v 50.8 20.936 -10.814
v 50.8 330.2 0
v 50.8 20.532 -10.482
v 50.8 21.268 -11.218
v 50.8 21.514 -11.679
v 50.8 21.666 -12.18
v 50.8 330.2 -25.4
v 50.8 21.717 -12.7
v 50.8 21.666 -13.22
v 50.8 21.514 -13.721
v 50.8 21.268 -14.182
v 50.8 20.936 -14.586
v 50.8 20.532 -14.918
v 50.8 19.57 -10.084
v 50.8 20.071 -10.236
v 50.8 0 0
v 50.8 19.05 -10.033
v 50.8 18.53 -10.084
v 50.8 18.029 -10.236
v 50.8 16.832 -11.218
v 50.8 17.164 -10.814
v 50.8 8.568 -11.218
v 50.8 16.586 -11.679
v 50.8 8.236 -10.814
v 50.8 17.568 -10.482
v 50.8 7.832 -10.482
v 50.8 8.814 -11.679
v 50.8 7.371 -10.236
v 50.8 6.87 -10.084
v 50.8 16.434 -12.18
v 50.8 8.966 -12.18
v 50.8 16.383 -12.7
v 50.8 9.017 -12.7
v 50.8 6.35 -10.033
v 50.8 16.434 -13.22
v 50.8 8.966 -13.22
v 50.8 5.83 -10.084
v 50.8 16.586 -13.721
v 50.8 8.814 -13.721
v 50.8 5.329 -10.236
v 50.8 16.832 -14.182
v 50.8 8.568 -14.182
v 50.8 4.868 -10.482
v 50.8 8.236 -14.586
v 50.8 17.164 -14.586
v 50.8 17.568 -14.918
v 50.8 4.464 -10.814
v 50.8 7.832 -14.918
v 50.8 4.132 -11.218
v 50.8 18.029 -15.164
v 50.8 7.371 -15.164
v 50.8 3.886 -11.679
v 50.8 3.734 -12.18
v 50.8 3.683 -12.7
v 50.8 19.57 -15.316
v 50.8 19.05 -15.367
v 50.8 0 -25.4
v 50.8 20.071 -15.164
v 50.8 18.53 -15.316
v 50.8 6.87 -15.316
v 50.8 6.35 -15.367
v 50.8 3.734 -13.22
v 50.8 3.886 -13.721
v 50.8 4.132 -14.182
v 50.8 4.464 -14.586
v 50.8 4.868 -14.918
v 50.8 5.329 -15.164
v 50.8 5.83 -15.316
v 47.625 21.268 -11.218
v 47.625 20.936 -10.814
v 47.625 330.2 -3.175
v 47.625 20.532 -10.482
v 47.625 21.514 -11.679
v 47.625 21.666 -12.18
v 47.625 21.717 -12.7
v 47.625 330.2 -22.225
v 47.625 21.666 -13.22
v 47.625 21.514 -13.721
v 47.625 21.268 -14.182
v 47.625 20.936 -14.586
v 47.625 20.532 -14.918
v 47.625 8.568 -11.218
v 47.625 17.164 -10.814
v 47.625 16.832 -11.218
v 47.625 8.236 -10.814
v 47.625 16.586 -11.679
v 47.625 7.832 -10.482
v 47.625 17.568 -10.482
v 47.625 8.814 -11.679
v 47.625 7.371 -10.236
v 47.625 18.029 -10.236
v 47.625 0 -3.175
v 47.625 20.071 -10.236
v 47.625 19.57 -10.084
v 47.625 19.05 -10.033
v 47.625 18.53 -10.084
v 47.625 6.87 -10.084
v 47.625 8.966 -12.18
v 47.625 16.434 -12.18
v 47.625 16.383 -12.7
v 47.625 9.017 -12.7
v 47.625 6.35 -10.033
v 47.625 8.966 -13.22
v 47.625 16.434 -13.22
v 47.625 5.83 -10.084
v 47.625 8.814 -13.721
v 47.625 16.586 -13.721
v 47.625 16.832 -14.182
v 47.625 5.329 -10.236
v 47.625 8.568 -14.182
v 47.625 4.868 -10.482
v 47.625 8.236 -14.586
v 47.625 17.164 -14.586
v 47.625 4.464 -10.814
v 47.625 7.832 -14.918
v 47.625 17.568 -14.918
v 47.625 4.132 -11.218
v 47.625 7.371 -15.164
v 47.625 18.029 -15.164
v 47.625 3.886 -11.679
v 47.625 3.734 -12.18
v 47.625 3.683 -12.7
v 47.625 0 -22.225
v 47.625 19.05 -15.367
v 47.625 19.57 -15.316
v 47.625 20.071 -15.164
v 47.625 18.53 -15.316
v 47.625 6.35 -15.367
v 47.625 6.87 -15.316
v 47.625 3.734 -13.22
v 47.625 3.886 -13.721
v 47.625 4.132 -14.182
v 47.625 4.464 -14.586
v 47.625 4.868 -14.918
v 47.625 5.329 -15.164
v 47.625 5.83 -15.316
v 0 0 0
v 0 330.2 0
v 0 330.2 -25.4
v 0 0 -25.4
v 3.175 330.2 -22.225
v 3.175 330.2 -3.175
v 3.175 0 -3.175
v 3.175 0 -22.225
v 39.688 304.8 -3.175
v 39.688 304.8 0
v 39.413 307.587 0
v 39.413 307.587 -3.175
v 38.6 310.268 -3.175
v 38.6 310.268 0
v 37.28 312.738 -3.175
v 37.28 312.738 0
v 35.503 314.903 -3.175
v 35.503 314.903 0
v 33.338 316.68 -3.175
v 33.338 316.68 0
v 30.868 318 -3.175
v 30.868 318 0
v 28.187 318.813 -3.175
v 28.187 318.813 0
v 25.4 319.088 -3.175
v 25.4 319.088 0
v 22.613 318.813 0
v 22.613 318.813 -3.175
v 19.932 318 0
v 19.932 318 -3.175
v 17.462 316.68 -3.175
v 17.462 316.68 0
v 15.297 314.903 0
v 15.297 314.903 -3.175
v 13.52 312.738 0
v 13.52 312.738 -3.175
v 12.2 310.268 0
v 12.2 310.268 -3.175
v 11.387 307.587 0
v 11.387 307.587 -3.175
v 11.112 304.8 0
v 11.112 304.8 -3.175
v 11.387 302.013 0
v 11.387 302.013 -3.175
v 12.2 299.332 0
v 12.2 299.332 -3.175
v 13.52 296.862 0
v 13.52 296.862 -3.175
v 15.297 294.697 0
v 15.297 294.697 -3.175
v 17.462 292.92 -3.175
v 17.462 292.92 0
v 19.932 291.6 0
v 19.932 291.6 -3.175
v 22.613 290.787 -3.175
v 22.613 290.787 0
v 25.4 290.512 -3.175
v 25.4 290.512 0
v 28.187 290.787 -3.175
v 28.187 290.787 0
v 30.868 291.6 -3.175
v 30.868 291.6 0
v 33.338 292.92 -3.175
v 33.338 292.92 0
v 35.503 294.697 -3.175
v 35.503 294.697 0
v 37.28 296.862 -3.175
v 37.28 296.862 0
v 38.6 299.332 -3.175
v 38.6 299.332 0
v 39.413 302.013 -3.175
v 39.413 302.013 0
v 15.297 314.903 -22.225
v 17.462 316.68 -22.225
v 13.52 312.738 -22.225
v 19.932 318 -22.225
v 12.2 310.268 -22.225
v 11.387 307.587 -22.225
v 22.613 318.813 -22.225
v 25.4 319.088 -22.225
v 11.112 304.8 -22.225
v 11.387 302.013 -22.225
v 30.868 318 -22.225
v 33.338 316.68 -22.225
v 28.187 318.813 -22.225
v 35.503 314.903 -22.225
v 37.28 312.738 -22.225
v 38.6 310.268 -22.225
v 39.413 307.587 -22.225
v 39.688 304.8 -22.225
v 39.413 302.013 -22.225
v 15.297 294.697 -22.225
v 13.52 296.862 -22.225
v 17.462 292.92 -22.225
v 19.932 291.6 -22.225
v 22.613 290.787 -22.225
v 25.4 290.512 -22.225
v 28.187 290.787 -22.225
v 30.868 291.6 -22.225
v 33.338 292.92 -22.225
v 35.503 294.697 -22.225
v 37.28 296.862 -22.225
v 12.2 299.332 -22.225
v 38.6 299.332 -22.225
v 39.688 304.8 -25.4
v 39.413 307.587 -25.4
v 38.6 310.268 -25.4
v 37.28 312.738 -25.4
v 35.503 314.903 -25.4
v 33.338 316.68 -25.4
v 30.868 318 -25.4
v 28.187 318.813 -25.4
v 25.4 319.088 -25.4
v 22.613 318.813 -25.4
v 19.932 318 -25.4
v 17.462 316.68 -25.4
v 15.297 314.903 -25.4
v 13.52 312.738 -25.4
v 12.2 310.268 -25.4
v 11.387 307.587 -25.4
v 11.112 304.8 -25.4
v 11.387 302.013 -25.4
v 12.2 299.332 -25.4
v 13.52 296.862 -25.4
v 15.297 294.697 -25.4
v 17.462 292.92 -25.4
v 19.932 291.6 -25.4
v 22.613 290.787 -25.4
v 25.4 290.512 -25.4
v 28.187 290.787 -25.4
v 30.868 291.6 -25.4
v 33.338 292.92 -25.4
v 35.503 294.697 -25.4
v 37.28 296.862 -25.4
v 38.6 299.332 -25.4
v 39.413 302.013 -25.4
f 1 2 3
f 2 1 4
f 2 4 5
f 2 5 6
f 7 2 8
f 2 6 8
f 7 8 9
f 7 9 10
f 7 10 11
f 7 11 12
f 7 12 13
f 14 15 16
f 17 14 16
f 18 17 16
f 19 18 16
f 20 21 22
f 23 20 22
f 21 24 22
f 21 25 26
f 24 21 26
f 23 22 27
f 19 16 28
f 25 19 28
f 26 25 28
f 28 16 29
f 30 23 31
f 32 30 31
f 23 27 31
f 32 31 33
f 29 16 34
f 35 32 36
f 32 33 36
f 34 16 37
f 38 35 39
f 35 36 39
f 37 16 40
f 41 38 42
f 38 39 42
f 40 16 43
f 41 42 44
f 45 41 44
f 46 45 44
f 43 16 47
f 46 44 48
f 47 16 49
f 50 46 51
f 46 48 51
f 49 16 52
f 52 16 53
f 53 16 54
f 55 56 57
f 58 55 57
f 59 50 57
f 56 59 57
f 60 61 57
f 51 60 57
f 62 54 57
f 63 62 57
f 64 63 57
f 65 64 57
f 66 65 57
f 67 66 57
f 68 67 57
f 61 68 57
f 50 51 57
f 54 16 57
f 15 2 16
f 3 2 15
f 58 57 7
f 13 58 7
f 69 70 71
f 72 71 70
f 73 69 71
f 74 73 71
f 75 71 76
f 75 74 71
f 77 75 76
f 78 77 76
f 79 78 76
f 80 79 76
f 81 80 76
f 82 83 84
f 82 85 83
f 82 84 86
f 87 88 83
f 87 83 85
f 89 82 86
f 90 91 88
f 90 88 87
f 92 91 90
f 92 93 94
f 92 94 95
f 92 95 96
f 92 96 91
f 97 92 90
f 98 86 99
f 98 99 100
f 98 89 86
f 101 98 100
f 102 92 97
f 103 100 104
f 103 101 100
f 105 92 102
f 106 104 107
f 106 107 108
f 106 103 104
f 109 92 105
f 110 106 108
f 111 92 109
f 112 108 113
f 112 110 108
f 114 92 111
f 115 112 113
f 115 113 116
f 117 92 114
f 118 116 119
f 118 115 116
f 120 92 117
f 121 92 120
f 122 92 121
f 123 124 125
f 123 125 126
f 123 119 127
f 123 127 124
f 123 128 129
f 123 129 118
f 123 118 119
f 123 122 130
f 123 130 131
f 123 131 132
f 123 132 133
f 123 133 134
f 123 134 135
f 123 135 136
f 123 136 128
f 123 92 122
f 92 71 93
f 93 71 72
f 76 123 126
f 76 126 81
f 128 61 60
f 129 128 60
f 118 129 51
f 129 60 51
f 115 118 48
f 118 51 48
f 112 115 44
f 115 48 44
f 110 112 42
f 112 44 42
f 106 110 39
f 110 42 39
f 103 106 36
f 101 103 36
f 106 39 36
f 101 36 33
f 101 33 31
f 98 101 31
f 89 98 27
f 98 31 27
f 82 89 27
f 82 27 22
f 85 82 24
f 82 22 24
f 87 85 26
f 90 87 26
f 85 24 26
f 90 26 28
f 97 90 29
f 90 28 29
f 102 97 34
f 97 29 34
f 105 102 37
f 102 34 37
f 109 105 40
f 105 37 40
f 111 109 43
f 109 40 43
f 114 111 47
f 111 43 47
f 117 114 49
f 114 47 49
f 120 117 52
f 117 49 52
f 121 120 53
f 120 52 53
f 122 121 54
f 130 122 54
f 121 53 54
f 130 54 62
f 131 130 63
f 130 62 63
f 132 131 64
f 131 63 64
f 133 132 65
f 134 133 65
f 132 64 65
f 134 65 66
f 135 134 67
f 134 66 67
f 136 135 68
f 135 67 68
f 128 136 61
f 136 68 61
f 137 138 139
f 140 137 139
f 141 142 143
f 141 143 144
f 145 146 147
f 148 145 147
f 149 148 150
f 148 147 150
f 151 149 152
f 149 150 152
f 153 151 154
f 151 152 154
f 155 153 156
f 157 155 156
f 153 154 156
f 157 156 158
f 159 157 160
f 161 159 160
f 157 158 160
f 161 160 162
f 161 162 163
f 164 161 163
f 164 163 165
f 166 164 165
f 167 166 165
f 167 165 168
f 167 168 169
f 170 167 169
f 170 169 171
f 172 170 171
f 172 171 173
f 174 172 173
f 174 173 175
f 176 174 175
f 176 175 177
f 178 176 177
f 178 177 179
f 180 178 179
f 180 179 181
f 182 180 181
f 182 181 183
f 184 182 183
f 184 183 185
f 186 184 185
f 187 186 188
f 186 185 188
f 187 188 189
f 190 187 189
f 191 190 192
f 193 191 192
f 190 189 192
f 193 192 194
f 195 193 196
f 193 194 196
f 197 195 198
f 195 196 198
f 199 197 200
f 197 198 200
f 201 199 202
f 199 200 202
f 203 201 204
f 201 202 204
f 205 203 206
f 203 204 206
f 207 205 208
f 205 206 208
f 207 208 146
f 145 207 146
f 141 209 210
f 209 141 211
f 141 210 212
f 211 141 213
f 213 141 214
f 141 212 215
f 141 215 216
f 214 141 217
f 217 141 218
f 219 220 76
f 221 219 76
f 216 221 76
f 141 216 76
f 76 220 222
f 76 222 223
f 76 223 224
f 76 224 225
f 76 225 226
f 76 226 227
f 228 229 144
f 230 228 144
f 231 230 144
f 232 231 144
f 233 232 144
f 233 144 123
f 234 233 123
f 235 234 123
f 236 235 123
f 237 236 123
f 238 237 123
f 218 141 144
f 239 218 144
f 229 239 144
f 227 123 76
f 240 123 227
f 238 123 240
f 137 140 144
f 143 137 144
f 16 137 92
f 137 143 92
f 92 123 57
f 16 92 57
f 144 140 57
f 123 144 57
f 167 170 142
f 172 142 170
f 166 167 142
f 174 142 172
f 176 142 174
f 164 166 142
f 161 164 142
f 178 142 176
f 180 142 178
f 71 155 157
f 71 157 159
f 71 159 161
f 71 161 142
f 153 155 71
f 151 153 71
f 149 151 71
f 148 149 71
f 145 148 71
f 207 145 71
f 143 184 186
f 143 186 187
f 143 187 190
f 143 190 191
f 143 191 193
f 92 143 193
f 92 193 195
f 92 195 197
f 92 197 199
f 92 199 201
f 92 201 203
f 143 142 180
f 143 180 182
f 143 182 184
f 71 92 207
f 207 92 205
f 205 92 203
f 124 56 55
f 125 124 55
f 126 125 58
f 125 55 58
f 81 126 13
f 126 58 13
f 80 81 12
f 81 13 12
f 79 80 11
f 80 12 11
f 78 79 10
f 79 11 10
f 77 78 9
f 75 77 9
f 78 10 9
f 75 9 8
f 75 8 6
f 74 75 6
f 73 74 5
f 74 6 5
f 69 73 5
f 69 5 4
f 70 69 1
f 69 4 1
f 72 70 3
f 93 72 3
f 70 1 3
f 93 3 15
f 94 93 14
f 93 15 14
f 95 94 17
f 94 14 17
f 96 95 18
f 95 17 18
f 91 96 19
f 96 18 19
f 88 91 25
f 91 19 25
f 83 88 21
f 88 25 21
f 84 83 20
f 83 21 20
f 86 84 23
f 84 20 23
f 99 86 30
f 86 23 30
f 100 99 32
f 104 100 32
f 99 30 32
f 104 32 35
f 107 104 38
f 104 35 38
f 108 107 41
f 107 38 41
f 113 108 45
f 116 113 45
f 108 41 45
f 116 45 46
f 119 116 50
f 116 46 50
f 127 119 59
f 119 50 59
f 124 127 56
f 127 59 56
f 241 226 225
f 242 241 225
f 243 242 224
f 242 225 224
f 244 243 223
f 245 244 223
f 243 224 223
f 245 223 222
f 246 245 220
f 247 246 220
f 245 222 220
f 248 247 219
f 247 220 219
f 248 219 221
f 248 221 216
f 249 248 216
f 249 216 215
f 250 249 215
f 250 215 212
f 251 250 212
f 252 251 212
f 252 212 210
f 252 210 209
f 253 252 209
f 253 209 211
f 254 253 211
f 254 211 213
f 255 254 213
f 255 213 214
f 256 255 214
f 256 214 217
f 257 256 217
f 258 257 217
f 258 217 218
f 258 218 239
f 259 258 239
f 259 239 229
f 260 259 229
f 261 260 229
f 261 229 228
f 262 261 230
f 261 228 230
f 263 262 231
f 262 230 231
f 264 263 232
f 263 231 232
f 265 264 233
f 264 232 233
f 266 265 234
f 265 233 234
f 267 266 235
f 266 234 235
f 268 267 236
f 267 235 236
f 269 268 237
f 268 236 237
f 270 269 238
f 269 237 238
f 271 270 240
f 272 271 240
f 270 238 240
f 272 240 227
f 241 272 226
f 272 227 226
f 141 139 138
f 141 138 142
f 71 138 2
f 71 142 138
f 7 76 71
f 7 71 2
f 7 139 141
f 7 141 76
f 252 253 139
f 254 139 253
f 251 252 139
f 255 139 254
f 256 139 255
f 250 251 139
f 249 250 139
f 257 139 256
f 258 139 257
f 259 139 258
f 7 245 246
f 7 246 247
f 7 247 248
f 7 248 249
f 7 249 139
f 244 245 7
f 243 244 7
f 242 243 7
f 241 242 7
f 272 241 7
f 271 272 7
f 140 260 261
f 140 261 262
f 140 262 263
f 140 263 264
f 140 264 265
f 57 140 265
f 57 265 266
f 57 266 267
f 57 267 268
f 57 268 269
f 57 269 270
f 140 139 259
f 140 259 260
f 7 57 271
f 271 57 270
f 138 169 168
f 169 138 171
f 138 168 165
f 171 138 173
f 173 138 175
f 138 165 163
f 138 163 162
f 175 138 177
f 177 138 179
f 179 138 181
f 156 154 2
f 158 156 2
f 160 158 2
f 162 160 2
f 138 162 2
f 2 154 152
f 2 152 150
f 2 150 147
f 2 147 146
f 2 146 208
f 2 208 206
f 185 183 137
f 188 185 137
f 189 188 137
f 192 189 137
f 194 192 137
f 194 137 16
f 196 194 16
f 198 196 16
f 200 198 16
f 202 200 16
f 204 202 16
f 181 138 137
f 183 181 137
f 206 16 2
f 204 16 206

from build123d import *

# Parameters (mm, degrees)
SKETCH1_W           = 50.8
SKETCH1_H           = 25.4
SKETCH1_W_2         = 44.45
SKETCH1_H_2         = 19.05
BOSS_EXTRUDE2_DEPTH = 330.2
SKETCH2_R           = 14.2875
CUT_EXTRUDE1_DEPTH  = 25.4
SKETCH3_R           = 2.667
CUT_EXTRUDE2_DEPTH  = 3.175


with BuildPart() as part:
    # Sketch1 → Boss-Extrude2 (new body)
    with BuildSketch(Plane(origin=(0, 0, 0), x_dir=(1, 0, 0), z_dir=(0, 1, 0))):
        with Locations((25.4, 12.7)):
            Rectangle(SKETCH1_W, SKETCH1_H)
        with Locations((25.4, 12.7)):
            Rectangle(SKETCH1_W_2, SKETCH1_H_2, mode=Mode.SUBTRACT)
    extrude(amount=BOSS_EXTRUDE2_DEPTH)

    # Sketch2 → Cut-Extrude1 (cut)
    with BuildSketch(Plane.XY):
        with Locations((25.4, 304.8)):
            Circle(SKETCH2_R)
    extrude(amount=-CUT_EXTRUDE1_DEPTH, mode=Mode.SUBTRACT)

    # Sketch3 → Cut-Extrude2 (cut)
    with BuildSketch(Plane(origin=(50.8, 0, 0), x_dir=(0, 0, -1), z_dir=(1, 0, 0))):
        with Locations((12.7, 19.05)):
            Circle(SKETCH3_R)
        with Locations((12.7, 6.35)):
            Circle(SKETCH3_R)
    extrude(amount=-CUT_EXTRUDE2_DEPTH, mode=Mode.SUBTRACT)


solid = part.part
